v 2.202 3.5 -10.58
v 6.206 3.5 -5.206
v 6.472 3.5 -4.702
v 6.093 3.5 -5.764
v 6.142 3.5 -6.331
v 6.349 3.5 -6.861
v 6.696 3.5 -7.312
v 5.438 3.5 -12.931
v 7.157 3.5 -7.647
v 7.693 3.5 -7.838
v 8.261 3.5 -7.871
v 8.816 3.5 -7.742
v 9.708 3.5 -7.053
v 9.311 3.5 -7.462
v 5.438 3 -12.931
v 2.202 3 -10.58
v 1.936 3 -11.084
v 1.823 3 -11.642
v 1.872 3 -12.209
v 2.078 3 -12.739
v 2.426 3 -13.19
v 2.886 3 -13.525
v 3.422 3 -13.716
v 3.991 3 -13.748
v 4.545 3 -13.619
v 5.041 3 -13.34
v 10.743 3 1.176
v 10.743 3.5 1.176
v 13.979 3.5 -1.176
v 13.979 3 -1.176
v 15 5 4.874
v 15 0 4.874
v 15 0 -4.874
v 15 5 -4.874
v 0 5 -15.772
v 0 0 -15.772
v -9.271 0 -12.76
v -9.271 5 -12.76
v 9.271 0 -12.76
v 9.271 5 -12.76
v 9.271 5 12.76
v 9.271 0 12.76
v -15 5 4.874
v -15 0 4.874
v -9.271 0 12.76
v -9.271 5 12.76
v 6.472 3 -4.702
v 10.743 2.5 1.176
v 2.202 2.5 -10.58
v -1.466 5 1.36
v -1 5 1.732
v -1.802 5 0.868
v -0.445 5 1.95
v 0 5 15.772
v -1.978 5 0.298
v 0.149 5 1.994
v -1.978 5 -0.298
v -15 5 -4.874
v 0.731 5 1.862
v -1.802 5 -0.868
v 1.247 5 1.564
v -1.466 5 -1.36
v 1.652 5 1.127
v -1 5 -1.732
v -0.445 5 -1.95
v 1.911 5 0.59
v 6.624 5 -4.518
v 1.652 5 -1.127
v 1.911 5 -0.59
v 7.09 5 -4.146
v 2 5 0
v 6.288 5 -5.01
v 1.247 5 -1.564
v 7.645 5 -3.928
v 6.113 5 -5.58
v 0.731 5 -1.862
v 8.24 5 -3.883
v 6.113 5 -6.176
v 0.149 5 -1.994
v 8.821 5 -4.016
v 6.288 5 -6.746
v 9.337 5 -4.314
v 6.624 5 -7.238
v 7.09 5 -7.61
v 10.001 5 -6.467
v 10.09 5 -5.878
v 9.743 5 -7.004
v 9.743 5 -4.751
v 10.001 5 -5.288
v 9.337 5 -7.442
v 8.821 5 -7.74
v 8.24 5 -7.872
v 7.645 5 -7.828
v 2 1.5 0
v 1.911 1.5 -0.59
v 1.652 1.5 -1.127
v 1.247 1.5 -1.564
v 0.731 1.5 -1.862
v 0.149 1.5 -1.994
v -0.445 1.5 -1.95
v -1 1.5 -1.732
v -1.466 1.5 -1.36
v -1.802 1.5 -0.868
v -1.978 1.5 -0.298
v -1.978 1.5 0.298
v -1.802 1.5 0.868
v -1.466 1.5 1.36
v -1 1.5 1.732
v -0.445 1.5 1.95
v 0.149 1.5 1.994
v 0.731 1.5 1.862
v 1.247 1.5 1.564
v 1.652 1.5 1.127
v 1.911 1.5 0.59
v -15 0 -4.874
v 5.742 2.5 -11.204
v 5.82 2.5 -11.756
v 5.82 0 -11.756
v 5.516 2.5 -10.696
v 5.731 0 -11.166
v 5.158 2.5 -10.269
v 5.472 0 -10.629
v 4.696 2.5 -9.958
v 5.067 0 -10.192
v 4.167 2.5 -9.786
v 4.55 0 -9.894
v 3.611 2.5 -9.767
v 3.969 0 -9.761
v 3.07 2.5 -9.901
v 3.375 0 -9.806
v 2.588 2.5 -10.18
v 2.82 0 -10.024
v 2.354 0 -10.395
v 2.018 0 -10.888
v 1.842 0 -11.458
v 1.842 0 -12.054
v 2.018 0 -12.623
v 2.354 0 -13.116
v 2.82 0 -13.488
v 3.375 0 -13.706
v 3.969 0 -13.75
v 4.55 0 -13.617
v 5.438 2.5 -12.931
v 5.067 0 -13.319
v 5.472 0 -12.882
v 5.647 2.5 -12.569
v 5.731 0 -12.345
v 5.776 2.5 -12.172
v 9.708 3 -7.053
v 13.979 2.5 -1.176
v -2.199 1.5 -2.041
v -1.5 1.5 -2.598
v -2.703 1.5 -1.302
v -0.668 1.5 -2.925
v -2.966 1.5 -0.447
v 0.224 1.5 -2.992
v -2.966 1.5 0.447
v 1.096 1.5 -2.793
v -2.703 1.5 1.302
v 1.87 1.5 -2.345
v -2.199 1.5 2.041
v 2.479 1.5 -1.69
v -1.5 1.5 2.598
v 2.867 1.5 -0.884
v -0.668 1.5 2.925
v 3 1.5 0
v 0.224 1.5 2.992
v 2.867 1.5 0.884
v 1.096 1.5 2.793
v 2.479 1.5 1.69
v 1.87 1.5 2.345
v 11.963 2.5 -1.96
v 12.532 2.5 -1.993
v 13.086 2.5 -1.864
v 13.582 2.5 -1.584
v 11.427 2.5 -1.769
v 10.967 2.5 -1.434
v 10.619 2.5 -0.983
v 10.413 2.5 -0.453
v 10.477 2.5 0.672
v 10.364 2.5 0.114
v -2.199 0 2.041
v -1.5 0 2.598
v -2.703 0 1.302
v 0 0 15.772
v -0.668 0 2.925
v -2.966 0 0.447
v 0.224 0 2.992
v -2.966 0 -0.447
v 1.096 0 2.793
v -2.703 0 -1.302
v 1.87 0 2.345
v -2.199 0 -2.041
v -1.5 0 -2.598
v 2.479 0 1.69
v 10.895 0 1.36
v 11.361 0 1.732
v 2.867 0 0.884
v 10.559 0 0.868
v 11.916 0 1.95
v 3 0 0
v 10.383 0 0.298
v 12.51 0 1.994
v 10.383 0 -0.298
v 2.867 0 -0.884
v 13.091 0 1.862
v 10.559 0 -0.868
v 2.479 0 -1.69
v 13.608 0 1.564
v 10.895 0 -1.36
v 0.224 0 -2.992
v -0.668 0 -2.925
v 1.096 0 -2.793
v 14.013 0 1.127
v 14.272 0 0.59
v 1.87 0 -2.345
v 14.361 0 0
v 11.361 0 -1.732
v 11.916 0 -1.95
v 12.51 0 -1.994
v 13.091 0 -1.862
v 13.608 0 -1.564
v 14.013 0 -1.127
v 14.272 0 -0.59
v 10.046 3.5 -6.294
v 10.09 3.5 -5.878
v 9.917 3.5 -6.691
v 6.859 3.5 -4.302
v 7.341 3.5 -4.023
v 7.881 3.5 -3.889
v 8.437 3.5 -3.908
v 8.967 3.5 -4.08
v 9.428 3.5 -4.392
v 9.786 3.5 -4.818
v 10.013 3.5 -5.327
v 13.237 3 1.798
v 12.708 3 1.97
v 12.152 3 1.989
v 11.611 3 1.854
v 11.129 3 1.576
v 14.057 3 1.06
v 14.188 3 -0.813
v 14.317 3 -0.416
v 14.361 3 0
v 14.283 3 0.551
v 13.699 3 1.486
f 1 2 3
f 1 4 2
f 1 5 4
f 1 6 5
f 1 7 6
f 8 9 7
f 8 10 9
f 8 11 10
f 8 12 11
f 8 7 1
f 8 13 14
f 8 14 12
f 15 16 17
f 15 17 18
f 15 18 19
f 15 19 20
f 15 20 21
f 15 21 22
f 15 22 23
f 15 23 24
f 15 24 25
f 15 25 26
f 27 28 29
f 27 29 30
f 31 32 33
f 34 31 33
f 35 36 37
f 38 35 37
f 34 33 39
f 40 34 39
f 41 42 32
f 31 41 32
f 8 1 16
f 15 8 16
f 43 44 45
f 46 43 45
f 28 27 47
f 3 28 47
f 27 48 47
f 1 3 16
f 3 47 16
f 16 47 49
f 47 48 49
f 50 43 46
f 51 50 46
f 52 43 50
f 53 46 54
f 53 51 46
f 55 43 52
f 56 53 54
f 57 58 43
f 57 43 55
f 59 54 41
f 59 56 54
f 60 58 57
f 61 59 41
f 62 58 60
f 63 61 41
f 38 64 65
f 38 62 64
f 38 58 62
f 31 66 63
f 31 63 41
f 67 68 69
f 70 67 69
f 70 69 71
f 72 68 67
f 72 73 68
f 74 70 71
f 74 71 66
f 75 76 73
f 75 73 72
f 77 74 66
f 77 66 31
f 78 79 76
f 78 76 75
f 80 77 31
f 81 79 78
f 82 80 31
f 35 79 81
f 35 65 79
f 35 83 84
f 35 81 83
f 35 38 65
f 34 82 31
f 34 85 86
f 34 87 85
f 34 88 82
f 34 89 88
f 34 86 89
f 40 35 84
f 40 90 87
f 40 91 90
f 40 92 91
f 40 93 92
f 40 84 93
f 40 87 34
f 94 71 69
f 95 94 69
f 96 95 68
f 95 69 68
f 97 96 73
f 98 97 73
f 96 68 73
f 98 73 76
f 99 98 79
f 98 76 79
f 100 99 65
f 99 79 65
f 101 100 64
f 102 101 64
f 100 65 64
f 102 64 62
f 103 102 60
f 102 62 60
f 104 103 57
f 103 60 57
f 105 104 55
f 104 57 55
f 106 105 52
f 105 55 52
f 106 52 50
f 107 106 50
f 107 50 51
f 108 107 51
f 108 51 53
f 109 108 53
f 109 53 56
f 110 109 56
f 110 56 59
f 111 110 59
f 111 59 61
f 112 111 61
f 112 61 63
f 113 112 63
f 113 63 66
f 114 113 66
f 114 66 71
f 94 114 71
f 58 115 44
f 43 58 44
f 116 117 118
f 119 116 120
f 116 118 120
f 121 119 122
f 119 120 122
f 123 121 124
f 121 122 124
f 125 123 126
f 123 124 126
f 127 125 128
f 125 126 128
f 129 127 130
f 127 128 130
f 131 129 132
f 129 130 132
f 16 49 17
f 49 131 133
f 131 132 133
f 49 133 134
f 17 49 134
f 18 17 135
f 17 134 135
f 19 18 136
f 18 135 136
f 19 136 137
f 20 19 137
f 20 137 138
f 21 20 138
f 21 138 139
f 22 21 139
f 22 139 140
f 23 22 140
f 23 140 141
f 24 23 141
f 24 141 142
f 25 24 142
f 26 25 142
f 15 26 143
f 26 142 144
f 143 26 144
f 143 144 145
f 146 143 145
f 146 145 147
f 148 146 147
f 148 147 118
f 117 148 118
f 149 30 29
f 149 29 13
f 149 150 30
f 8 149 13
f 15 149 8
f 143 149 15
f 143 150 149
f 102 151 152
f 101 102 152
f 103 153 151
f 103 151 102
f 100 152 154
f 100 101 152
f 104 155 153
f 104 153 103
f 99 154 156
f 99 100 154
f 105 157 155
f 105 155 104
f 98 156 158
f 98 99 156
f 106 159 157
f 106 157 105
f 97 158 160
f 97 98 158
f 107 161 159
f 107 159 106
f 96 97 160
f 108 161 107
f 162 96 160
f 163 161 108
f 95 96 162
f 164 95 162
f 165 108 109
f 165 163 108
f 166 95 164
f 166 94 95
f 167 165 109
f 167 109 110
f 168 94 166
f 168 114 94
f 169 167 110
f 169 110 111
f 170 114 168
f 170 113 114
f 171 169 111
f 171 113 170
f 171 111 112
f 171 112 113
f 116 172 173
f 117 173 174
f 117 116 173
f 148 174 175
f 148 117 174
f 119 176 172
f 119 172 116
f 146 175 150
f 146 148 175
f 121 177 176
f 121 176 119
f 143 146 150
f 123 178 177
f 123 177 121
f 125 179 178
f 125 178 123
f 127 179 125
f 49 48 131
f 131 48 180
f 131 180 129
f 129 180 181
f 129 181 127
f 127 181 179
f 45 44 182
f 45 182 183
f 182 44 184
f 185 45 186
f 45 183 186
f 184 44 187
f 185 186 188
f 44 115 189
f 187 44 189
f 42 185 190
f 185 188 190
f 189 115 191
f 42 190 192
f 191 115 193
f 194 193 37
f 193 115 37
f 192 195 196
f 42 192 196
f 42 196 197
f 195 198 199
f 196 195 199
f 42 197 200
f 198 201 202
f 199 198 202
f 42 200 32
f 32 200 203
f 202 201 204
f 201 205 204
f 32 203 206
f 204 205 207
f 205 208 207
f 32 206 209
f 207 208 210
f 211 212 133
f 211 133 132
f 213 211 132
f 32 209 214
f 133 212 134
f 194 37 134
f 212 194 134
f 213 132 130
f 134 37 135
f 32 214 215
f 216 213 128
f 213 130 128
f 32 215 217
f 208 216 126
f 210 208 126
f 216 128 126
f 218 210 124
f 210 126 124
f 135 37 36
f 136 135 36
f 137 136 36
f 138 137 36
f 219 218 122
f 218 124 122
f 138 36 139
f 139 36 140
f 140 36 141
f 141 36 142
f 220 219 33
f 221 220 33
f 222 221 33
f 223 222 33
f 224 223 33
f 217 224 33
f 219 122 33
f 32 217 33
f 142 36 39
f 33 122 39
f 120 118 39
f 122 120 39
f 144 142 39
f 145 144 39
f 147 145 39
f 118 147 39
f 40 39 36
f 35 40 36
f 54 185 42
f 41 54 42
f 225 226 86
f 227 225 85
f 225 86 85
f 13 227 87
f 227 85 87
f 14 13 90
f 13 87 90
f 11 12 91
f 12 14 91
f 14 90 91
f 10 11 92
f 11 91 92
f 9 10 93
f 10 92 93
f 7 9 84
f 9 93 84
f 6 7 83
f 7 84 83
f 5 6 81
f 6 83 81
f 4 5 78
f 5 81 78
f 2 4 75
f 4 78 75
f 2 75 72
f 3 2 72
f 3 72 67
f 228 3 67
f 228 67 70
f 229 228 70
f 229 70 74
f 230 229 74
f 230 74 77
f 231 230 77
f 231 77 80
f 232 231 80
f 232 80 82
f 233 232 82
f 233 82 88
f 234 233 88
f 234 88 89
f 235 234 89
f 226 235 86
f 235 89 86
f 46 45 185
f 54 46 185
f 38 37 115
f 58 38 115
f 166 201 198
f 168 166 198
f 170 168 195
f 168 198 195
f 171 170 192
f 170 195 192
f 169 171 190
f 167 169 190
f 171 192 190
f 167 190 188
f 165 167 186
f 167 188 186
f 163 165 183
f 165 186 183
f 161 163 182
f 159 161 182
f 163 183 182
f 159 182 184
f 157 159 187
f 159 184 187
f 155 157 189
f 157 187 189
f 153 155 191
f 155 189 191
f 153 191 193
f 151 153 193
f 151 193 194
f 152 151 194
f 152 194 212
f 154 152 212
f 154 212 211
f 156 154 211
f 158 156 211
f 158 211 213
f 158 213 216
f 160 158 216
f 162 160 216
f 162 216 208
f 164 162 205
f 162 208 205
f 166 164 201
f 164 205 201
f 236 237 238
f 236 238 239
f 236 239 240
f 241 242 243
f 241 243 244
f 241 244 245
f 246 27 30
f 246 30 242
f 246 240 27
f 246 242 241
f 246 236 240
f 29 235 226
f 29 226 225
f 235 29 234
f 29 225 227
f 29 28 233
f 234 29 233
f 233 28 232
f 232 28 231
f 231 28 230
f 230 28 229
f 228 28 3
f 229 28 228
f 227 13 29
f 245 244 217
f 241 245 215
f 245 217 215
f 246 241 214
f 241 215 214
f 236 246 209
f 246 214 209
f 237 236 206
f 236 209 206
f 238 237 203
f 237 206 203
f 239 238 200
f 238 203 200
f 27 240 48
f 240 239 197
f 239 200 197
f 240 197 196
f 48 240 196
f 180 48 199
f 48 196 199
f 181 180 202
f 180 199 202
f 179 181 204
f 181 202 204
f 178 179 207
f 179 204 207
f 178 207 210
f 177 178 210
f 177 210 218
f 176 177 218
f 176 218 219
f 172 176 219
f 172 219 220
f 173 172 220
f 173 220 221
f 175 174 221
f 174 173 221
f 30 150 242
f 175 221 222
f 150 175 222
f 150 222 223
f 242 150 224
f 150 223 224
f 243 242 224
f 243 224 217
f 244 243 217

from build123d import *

# Parameters (mm, degrees)
BOSS_EXTRUDE1_DEPTH     = 5
SKETCH2_R               = 2
CUT_EXTRUDE1_DEPTH      = 5
SKETCH4_R               = 3
CUT_EXTRUDE2_DEPTH      = 1.5
SKETCH25_R              = 2
CUT_EXTRUDE3_DEPTH      = 2
SKETCH19_R              = 2
CUT_EXTRUDE4_DEPTH      = 3
SKETCH26_W              = 14.53085056
SKETCH26_H              = 1
CUT_EXTRUDE5_DEPTH      = 2
CUT_EXTRUDE5_DEPTH_BACK = 2


with BuildPart() as part:
    # Sketch1 → Boss-Extrude1 (new body)
    with BuildSketch(Plane(origin=(0, 0, 0), x_dir=(1, 0, 0), z_dir=(0, 1, 0))):
        Polygon((9.270509831, -12.759762125), (15, -4.873795443), (15, 4.873795443), (9.270509831, 12.759762125), (0, 15.771933364), (-9.270509831, 12.759762125), (-15, 4.873795443), (-15, -4.873795443), (-9.270509831, -12.759762125), (0, -15.771933364), align=None)
    extrude(amount=BOSS_EXTRUDE1_DEPTH)

    # Sketch2 → Cut-Extrude1 (cut)
    with BuildSketch(Plane(origin=(0, 5, 0), x_dir=(1, 0, 0), z_dir=(0, 1, 0))):
        Circle(SKETCH2_R)
    extrude(amount=-CUT_EXTRUDE1_DEPTH, mode=Mode.SUBTRACT)

    # Sketch4 → Cut-Extrude2 (cut)
    with BuildSketch(Plane.XZ):
        Circle(SKETCH4_R)
    extrude(amount=-CUT_EXTRUDE2_DEPTH, mode=Mode.SUBTRACT)

    # Sketch25 → Cut-Extrude3 (cut)
    with BuildSketch(Plane(origin=(0, 5, 0), x_dir=(1, 0, 0), z_dir=(0, 1, 0))):
        with Locations((8.090169944, 5.877852523)):
            Circle(SKETCH25_R)
    extrude(amount=-CUT_EXTRUDE3_DEPTH, mode=Mode.SUBTRACT)

    # Sketch19 → Cut-Extrude4 (cut)
    with BuildSketch(Plane.XZ):
        with Locations((12.360679775, 0)):
            Circle(SKETCH19_R)
        with Locations((3.819660113, -11.755705046)):
            Circle(SKETCH19_R)
    extrude(amount=-CUT_EXTRUDE4_DEPTH, mode=Mode.SUBTRACT)

    # Sketch26 → Cut-Extrude5 (cut, two sides)
    with BuildSketch(Plane(origin=(8.090169944, 0, -5.877852523), x_dir=(-0.587785252, 0, -0.809016994), z_dir=(-0.809016994, 0, 0.587785252))) as cut_extrude5_sk:
        with Locations((0, -3)):
            Rectangle(SKETCH26_W, SKETCH26_H)
    extrude(amount=CUT_EXTRUDE5_DEPTH, mode=Mode.SUBTRACT)
    extrude(cut_extrude5_sk.sketch, amount=-CUT_EXTRUDE5_DEPTH_BACK, mode=Mode.SUBTRACT)


solid = part.part
